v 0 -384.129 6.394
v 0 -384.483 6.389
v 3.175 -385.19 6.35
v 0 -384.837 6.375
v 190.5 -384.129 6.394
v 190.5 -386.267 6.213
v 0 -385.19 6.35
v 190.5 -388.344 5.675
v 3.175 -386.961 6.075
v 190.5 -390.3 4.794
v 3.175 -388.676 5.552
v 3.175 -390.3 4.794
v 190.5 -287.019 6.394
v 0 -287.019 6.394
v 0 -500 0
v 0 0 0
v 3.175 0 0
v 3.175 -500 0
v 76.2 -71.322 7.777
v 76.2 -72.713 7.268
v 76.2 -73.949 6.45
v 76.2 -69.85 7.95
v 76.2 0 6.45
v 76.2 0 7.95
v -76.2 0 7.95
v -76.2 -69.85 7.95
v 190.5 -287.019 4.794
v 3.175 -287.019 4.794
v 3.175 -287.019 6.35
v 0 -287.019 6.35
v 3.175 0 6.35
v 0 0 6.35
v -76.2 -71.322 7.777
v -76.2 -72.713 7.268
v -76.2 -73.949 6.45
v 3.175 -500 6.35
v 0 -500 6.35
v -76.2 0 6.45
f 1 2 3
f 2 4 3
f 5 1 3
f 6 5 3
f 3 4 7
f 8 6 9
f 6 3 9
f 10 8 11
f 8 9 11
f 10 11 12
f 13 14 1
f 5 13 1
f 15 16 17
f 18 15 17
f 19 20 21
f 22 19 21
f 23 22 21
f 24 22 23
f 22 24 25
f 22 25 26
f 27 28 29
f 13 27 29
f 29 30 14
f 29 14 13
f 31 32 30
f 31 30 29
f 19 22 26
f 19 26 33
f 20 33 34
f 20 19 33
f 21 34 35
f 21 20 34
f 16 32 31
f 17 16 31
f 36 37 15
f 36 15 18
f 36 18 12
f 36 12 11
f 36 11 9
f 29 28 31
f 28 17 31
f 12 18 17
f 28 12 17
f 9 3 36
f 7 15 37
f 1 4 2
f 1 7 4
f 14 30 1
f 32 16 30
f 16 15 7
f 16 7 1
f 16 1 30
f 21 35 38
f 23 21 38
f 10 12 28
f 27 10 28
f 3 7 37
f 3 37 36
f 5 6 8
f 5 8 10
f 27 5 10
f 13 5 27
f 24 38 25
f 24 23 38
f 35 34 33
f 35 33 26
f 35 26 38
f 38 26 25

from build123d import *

# Parameters (mm, degrees)
F0_W     = 3.175
F0_H     = 6.35
F1_DEPTH = 500
F3_DEPTH = 76.2
F6_DEPTH = 190.5


with BuildPart() as f1:
    # F0 (on Front) → F1 (new body)
    with BuildSketch(Plane.XZ):
        with Locations((1.5875, 3.175)):
            Rectangle(F0_W, F0_H)
    extrude(amount=F1_DEPTH)

    # F5 (on Right) → F6 (join)
    with BuildSketch(Plane.YZ):
        with BuildLine():
            Line((-390.300279, 4.794227), (-287.0191, 4.794227))
            Line((-287.0191, 4.794227), (-287.0191, 6.394427))
            Line((-287.0191, 6.394427), (-384.12902, 6.394427))
            ThreePointArc((-384.12902, 6.394427), (-387.316694, 5.98787), (-390.300279, 4.794227))
        make_face()
    extrude(amount=F6_DEPTH)


with BuildPart() as f3:
    # F2 (on Right) → F3 (new body)
    with BuildSketch(Plane.YZ):
        with BuildLine():
            Line((0, 6.449902), (0, 7.95))
            Line((0, 7.95), (-69.85, 7.95))
            ThreePointArc((-69.85, 7.95), (-72.032387, 7.563194), (-73.948896, 6.449902))
            Line((-73.948896, 6.449902), (0, 6.449902))
        make_face()
    extrude(amount=F3_DEPTH)

    # F4: F3 across plane


with BuildPart() as f3_1:
    add(f3.part)
    add(f3.part.mirror(Plane.YZ))


solid = Compound([f1.part, f3_1.part])
